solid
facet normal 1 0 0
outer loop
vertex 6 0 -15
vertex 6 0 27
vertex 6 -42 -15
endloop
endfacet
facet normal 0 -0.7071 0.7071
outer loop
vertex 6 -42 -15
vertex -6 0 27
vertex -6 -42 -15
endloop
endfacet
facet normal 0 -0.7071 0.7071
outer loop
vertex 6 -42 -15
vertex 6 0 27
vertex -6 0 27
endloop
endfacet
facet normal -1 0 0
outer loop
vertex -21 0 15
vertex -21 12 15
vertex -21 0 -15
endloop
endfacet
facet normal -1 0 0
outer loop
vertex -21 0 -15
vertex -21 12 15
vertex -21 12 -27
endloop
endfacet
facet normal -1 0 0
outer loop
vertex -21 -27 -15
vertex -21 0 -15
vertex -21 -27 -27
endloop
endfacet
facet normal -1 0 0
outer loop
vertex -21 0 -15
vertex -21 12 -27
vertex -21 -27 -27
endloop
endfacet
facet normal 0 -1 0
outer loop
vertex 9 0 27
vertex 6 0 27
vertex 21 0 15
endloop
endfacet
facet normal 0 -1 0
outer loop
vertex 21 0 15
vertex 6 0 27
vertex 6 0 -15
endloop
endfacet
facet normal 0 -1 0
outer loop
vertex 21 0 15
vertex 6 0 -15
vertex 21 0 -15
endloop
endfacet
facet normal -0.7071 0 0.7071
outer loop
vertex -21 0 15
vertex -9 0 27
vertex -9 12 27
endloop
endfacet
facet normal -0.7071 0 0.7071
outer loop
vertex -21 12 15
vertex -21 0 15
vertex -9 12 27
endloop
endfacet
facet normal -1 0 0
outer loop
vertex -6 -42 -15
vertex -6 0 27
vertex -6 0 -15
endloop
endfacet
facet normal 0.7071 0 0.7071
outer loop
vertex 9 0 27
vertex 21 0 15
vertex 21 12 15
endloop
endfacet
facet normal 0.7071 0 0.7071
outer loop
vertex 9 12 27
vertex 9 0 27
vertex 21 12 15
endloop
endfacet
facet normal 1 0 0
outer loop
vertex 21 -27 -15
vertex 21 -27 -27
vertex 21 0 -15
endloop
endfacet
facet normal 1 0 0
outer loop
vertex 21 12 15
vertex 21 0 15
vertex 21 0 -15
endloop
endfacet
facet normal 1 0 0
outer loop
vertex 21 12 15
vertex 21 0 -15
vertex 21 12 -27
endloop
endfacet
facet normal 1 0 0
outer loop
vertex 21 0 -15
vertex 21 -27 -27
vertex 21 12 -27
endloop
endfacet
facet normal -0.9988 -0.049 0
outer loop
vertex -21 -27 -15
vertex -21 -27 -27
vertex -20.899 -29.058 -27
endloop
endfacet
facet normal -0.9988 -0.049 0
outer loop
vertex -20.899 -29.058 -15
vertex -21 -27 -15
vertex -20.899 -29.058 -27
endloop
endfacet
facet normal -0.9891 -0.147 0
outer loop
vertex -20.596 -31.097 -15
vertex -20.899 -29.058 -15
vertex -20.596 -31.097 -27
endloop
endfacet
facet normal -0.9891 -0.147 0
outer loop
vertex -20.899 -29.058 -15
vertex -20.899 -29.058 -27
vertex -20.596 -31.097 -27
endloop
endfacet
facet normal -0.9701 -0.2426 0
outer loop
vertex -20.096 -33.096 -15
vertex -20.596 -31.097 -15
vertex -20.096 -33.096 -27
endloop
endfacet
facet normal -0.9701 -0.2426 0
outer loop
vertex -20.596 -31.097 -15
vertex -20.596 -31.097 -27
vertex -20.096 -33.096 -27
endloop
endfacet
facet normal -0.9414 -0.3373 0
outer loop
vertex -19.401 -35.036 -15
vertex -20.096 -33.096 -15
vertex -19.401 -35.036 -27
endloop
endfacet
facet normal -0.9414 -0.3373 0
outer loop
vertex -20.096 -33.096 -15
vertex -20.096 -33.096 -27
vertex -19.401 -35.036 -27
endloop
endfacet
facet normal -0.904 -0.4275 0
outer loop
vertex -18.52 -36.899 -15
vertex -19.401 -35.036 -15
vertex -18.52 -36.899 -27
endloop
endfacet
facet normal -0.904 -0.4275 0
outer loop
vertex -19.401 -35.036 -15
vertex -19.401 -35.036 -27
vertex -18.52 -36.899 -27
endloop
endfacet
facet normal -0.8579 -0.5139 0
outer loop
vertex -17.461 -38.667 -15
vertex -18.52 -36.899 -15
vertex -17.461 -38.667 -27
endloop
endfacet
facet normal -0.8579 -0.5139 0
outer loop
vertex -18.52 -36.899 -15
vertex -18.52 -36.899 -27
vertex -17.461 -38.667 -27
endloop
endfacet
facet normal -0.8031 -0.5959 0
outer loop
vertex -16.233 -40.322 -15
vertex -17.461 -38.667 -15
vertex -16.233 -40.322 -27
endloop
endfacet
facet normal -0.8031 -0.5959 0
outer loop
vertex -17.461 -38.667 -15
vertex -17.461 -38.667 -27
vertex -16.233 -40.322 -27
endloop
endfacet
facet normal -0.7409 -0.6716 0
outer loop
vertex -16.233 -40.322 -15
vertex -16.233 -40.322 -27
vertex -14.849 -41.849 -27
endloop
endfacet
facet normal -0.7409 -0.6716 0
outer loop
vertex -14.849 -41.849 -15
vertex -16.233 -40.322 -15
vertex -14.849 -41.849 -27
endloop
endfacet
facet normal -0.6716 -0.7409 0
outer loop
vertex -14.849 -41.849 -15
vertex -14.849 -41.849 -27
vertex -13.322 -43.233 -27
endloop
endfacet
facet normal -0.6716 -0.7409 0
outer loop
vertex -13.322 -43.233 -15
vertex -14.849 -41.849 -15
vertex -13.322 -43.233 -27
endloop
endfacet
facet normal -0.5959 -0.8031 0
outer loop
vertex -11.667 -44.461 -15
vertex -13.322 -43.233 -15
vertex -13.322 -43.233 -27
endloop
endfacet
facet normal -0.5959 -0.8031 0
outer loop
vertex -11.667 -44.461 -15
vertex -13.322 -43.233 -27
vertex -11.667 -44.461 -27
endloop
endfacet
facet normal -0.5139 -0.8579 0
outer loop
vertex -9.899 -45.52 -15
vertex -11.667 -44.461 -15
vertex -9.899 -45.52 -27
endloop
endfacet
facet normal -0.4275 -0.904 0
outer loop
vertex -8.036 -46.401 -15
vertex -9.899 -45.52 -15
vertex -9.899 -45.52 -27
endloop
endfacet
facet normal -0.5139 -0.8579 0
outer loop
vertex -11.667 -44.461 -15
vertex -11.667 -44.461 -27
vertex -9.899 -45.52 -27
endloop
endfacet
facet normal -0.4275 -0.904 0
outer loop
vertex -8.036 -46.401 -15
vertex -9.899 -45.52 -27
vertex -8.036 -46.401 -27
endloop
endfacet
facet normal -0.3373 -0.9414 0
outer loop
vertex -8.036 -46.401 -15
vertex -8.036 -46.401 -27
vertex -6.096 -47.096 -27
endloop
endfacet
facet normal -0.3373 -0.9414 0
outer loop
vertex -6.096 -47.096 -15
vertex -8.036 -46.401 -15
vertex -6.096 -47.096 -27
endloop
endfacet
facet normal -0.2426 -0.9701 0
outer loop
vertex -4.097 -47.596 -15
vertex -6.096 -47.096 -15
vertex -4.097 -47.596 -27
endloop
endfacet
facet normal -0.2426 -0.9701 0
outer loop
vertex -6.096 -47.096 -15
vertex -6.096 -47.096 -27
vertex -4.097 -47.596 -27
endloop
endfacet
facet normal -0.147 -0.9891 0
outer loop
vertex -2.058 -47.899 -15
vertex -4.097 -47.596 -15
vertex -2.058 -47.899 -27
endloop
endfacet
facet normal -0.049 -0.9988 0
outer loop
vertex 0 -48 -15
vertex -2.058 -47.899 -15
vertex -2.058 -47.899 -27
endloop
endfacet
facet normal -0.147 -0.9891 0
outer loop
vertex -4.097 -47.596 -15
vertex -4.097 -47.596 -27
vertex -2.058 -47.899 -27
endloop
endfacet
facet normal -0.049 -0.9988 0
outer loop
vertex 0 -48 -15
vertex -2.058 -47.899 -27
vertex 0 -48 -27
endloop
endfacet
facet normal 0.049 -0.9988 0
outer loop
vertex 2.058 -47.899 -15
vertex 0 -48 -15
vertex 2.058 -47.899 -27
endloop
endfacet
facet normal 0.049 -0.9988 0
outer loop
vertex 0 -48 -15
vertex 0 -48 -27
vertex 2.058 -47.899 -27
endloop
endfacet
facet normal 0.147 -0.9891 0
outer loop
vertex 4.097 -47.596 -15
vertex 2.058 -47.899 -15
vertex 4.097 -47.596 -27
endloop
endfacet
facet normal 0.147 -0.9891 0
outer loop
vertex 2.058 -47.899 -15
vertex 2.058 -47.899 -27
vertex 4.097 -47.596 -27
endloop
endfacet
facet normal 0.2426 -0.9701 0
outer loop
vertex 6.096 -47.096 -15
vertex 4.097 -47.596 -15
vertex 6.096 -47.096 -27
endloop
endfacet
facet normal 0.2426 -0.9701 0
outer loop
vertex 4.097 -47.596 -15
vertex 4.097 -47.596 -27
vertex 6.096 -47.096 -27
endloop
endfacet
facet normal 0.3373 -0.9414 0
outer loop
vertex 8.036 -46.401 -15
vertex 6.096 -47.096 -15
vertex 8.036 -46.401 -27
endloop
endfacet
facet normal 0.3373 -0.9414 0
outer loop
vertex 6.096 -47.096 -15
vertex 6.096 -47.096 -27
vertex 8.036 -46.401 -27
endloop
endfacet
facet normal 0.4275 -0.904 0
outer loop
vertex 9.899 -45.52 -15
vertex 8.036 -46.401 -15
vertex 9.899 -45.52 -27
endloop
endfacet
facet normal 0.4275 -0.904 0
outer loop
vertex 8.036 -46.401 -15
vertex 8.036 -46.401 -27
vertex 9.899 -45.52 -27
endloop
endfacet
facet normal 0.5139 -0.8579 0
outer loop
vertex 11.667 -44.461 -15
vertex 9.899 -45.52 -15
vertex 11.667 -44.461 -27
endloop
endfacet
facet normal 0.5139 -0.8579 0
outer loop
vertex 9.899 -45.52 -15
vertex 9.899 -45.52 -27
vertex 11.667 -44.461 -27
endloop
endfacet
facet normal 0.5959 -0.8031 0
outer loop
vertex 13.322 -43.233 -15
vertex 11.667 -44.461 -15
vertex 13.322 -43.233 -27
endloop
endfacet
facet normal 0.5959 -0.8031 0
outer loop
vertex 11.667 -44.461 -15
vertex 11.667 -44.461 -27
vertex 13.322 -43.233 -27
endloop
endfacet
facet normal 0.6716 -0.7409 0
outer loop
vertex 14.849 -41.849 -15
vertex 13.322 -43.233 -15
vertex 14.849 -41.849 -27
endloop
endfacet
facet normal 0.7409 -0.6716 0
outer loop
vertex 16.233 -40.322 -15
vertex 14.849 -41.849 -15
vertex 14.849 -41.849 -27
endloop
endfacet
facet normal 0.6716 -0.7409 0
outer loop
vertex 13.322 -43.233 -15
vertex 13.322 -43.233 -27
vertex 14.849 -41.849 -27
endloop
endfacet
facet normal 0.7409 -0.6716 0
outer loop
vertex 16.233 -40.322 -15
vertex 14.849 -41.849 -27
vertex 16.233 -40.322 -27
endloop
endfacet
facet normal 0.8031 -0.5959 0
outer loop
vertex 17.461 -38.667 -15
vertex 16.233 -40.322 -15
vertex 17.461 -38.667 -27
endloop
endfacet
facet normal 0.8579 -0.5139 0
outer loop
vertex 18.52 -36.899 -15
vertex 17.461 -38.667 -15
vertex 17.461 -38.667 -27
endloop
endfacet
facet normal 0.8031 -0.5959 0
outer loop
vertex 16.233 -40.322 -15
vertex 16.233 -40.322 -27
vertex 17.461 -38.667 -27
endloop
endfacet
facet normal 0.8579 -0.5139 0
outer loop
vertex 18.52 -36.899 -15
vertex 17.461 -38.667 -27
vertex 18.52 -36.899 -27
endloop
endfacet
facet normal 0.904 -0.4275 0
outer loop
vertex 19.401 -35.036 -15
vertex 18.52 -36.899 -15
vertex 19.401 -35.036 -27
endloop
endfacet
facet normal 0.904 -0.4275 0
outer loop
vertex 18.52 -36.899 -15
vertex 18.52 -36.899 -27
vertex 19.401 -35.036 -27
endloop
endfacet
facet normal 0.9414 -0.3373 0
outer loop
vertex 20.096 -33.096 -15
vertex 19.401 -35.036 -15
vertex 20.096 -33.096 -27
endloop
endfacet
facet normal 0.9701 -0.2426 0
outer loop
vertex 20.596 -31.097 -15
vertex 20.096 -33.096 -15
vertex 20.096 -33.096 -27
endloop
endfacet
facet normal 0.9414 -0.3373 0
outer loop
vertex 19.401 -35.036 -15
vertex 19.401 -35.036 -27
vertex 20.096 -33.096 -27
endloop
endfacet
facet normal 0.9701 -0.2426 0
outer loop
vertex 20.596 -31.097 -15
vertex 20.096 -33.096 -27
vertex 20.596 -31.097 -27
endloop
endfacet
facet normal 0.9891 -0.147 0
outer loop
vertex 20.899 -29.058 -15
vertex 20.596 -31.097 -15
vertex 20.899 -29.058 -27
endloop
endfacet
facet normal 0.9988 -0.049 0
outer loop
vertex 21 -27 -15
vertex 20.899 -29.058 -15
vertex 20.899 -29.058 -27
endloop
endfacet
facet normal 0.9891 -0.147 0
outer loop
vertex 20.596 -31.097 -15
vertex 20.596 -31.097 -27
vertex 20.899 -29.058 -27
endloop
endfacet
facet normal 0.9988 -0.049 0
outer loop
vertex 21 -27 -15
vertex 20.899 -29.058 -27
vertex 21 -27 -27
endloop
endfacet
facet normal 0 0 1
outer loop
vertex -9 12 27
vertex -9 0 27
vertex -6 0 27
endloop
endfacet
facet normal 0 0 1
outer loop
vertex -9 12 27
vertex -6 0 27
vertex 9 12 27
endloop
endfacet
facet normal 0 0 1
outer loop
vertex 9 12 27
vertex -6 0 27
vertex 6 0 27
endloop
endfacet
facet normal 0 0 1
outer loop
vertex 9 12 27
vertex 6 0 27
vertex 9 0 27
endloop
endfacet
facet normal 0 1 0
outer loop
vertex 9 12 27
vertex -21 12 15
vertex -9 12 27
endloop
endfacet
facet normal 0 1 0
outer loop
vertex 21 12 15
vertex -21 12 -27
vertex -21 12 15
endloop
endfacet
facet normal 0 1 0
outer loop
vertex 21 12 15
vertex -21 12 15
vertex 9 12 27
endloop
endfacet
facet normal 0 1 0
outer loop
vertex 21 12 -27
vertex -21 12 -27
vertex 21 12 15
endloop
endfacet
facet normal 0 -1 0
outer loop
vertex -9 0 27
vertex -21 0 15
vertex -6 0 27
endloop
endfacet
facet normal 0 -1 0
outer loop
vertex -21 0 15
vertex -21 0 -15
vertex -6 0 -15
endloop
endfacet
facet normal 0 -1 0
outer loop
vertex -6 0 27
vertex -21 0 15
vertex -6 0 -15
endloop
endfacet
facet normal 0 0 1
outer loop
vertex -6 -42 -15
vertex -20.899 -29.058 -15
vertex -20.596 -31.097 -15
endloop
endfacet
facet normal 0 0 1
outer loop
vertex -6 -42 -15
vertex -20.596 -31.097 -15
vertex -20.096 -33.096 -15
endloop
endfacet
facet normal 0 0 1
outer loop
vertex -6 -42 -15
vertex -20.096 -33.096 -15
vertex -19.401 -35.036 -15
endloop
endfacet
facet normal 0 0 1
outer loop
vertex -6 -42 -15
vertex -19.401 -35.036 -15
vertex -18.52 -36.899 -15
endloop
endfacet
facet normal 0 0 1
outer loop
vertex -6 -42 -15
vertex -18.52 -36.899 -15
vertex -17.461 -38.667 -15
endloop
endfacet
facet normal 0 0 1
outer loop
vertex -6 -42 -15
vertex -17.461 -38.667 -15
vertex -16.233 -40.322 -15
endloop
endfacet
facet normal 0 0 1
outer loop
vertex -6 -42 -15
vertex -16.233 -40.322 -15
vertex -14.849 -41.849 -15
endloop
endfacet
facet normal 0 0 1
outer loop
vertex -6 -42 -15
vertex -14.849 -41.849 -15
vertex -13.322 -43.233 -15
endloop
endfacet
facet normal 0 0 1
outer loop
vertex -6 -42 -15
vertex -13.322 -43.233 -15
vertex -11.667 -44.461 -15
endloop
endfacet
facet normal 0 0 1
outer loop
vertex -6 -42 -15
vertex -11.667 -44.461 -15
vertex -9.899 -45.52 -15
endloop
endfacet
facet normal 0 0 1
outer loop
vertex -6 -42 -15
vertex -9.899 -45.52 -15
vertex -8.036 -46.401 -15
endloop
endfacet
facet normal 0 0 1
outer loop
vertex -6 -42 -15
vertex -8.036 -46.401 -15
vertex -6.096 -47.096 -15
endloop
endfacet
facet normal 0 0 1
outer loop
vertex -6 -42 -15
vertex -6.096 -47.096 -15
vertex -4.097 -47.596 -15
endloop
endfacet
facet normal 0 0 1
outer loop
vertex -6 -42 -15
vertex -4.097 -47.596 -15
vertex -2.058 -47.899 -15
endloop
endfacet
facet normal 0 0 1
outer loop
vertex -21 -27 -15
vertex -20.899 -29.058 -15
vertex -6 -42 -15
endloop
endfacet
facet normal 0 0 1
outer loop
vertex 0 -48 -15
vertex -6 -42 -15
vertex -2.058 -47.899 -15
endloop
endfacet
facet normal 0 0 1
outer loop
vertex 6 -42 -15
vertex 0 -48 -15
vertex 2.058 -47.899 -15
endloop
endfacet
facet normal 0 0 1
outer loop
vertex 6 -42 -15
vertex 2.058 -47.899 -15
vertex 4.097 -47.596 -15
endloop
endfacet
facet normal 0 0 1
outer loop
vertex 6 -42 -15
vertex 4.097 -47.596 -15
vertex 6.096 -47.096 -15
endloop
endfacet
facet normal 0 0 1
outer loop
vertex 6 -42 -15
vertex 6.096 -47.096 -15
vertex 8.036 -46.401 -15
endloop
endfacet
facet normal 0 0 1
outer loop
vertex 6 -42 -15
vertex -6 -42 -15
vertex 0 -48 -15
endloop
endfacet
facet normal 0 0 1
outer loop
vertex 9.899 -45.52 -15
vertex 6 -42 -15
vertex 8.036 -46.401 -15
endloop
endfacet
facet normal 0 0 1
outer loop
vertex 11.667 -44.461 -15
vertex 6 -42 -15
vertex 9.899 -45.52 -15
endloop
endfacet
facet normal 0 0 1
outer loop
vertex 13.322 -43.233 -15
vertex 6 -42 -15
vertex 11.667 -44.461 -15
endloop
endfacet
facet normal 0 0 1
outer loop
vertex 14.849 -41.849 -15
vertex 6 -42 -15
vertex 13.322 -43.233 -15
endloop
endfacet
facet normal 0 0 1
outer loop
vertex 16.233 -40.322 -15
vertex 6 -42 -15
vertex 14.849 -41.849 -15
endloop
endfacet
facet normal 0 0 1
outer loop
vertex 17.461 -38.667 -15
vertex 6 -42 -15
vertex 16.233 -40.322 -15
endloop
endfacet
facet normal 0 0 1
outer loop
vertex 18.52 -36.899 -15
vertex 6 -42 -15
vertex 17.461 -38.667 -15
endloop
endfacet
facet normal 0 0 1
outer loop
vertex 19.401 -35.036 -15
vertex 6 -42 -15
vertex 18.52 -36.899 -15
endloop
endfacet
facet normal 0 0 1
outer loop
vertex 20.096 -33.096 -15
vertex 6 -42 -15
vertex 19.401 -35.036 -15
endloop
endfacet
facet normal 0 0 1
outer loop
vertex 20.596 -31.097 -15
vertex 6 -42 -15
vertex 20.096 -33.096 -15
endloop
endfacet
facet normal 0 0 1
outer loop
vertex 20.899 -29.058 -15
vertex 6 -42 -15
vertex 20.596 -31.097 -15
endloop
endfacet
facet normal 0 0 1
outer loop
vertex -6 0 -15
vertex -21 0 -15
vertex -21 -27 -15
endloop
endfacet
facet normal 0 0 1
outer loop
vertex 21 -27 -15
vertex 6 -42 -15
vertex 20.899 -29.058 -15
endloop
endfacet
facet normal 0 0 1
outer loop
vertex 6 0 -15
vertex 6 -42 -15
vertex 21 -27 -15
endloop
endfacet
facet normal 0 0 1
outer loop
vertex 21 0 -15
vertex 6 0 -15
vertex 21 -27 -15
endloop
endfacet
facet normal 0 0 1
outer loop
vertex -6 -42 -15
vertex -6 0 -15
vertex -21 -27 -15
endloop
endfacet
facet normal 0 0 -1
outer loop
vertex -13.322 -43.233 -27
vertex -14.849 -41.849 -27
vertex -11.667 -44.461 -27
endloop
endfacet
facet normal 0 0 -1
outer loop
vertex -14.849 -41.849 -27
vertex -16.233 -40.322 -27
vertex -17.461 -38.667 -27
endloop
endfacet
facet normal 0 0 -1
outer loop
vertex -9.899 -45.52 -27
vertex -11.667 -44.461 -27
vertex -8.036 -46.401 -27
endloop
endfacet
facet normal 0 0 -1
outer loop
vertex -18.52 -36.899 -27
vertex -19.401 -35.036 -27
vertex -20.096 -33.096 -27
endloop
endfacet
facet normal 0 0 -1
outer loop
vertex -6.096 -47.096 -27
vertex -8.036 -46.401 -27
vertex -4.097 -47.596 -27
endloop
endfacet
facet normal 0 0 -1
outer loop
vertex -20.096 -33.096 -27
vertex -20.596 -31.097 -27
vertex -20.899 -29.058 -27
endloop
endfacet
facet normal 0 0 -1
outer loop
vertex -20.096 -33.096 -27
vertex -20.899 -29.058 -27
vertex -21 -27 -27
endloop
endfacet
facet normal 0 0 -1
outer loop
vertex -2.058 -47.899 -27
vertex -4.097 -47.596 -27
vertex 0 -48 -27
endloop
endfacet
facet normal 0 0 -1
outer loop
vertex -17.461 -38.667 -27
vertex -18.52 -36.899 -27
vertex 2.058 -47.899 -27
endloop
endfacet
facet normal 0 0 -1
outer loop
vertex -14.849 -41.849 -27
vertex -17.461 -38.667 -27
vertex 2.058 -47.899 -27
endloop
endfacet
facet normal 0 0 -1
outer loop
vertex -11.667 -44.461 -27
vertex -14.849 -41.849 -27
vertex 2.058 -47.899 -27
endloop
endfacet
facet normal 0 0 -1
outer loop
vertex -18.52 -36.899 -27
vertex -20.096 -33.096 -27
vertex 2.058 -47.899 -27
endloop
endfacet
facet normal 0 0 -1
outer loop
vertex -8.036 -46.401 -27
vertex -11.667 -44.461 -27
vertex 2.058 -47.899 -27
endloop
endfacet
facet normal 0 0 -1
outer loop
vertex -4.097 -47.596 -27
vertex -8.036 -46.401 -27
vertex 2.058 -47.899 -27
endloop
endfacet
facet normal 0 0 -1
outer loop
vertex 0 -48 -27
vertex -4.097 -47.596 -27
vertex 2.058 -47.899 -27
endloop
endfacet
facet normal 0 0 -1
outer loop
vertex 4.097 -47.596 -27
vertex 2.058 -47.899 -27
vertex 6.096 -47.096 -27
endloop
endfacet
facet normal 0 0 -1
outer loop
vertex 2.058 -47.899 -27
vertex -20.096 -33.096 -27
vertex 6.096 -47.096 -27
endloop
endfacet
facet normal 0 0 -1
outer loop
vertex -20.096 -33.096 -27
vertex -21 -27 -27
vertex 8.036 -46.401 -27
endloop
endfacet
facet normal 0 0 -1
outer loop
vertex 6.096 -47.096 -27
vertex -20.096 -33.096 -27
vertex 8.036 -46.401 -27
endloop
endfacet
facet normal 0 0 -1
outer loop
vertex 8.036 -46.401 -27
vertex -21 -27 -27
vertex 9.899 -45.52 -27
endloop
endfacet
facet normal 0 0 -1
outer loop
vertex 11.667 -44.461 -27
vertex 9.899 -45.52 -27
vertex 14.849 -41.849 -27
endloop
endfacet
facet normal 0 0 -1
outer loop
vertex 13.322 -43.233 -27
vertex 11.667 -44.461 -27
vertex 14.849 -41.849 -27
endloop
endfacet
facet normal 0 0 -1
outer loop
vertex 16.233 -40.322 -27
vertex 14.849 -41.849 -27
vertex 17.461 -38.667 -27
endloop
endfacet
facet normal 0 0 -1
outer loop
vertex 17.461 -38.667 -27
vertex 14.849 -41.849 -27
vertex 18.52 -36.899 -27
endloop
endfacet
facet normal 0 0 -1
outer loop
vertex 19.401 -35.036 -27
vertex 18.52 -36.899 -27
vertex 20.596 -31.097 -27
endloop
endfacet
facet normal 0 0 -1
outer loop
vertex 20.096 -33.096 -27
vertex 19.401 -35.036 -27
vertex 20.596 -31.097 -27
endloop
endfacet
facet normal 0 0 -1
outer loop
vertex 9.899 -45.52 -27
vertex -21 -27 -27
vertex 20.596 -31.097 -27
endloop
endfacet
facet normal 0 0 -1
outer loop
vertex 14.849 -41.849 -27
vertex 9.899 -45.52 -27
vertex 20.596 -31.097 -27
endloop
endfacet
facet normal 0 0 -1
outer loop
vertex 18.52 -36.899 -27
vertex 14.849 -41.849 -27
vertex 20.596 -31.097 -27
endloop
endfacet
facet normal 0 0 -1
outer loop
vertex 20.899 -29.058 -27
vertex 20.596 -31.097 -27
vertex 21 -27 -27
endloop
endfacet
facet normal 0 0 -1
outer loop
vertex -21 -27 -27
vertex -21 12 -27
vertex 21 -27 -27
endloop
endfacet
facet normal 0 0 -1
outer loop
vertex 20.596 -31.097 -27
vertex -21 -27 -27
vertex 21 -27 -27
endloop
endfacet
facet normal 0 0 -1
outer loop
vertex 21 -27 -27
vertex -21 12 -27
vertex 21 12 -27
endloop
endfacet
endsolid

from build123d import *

# Parameters (mm, degrees)
SKETCH1_W           = 42
SKETCH1_H           = 54
BOSS_EXTRUDE1_DEPTH = 12
CHAMFER2_SIZE       = 12
BOSS_EXTRUDE2_DEPTH = 12
BOSS_EXTRUDE3_DEPTH = 6


with BuildPart() as part:
    # Sketch1 → Boss-Extrude1 (new body)
    with BuildSketch(Plane(origin=(0, 0, 0), x_dir=(1, 0, 0), z_dir=(0, 1, 0))):
        Rectangle(SKETCH1_W, SKETCH1_H)
    extrude(amount=BOSS_EXTRUDE1_DEPTH)

    # Chamfer2
    chamfer2_edges = [part.edges().sort_by_distance(p)[0] for p in [
        (21, 6, 27),
        (-21, 6, 27),
    ]]
    chamfer(chamfer2_edges, length=CHAMFER2_SIZE)

    # Sketch2 → Boss-Extrude2 (add)
    with BuildSketch(Plane(origin=(0, 0, -27), x_dir=(-1, 0, 0), z_dir=(0, 0, -1))):
        with BuildLine():
            Line((21, 0), (21, -27))
            ThreePointArc((21, -27), (0, -48), (-21, -27))
            Line((-21, -27), (-21, 0))
            Line((-21, 0), (21, 0))
        make_face()
    extrude(amount=-BOSS_EXTRUDE2_DEPTH)

    # Sketch8 → Boss-Extrude3 (add, symmetric)
    with BuildSketch(Plane(origin=(0, 0, 0), x_dir=(0, 0, -1), z_dir=(1, 0, 0))):
        Polygon((15, -42), (15, 0), (-27, 0), align=None)
    extrude(amount=BOSS_EXTRUDE3_DEPTH, both=True)


solid = part.part
